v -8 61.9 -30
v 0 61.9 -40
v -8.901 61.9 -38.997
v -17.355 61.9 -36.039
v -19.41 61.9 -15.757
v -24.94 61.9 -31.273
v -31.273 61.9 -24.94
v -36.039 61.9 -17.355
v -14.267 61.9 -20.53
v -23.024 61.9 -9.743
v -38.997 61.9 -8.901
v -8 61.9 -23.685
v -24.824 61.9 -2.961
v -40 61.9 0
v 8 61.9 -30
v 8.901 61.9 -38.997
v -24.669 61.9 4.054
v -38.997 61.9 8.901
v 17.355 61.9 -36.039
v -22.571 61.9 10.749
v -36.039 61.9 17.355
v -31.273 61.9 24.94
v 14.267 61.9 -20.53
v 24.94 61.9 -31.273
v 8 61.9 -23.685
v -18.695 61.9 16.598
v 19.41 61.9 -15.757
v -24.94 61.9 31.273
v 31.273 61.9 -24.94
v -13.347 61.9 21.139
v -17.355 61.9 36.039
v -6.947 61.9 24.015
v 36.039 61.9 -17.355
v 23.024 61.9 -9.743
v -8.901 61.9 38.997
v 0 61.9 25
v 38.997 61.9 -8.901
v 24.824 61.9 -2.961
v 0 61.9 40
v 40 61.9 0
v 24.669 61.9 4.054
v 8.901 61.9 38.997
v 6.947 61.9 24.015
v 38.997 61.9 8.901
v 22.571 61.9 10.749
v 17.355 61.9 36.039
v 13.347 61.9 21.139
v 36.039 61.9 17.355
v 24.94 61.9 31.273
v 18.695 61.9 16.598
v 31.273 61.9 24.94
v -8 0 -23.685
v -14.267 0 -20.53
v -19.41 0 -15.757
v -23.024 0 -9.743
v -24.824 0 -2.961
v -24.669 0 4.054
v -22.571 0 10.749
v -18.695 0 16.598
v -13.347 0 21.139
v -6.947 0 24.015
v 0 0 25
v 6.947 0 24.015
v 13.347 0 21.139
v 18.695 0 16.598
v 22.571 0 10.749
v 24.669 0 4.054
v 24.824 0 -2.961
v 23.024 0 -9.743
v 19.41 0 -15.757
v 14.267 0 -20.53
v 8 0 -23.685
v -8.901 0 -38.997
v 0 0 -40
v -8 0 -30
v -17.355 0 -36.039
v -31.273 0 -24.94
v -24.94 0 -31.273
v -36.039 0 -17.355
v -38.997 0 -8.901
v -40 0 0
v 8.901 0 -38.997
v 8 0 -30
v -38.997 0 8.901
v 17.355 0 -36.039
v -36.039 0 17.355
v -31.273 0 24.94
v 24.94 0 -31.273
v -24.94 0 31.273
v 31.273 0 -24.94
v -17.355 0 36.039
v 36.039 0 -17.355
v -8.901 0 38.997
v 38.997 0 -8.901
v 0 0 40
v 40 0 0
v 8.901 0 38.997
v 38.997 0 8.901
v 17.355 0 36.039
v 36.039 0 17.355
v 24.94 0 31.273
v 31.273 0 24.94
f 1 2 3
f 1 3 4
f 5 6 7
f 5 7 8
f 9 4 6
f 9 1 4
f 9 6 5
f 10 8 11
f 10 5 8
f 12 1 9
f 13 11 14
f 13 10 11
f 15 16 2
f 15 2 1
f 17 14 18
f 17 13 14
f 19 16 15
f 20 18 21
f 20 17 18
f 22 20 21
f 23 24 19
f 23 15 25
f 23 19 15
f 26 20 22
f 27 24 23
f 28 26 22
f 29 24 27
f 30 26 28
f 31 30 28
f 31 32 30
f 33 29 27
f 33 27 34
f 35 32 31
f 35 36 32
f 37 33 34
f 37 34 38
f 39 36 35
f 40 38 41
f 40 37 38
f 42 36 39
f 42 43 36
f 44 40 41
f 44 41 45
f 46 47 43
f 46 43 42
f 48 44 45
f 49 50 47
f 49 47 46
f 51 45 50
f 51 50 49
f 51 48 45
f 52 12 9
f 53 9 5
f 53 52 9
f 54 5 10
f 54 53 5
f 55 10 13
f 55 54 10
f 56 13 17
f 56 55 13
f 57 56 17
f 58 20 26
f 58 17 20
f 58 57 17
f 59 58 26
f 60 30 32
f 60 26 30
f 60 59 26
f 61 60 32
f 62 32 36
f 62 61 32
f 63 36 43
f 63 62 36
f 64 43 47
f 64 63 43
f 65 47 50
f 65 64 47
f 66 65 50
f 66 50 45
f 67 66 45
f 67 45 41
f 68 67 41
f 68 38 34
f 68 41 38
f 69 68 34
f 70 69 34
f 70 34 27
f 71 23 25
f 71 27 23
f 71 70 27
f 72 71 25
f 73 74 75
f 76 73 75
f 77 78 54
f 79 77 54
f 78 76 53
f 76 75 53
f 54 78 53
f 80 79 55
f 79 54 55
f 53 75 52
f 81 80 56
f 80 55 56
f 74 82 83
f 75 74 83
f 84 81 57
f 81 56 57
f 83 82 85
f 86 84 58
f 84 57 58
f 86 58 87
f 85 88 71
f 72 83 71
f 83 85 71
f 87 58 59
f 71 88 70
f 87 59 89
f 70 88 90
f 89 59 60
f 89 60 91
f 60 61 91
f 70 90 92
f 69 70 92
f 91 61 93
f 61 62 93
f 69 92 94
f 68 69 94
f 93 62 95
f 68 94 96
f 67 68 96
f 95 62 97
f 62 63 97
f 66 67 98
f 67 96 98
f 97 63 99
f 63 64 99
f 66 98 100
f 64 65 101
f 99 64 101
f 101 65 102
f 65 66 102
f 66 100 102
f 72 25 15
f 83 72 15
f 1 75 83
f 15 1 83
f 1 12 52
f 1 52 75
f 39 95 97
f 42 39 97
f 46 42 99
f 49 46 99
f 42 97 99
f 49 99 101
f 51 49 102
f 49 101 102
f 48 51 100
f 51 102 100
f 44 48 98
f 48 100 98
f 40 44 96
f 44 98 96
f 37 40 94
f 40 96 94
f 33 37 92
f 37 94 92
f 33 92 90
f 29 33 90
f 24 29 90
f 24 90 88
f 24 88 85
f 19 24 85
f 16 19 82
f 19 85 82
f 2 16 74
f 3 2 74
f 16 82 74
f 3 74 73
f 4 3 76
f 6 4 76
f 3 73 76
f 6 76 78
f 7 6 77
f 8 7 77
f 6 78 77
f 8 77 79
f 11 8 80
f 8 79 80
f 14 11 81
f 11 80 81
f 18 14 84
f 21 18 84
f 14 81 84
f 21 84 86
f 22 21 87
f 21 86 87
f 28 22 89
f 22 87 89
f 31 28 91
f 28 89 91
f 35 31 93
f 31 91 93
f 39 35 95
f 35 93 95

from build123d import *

# Parameters (mm, degrees)
SKETCH1_R               = 40
SKETCH1_R_2             = 25
BOSS_EXTRUDE1_DEPTH     = 61.9
CUT_EXTRUDE1_DEPTH      = 84.854695754
CUT_EXTRUDE1_DEPTH_BACK = 84.854695754
SKETCH2_W               = 16
SKETCH2_H               = 10


with BuildPart() as part:
    # Sketch1 → Boss-Extrude1 (new body)
    with BuildSketch(Plane(origin=(0, 0, 0), x_dir=(1, 0, 0), z_dir=(0, 1, 0))):
        with Locations(Location((0, 0, 0), (0, 0, 270))):
            Circle(SKETCH1_R)
        with Locations(Location((0, 0, 0), (0, 0, 270))):
            Circle(SKETCH1_R_2, mode=Mode.SUBTRACT)
    extrude(amount=BOSS_EXTRUDE1_DEPTH)

    # Sketch2 → Cut-Extrude1 (cut, two sides: drawn at the far end of the back side and taken through both)
    with BuildSketch(Plane(origin=(0, 61.9, 0), x_dir=(1, 0, 0), z_dir=(0, 1, 0)).offset(-CUT_EXTRUDE1_DEPTH_BACK)):
        with Locations((0, 25)):
            Rectangle(SKETCH2_W, SKETCH2_H)
    extrude(amount=CUT_EXTRUDE1_DEPTH + CUT_EXTRUDE1_DEPTH_BACK, mode=Mode.SUBTRACT)


solid = part.part
